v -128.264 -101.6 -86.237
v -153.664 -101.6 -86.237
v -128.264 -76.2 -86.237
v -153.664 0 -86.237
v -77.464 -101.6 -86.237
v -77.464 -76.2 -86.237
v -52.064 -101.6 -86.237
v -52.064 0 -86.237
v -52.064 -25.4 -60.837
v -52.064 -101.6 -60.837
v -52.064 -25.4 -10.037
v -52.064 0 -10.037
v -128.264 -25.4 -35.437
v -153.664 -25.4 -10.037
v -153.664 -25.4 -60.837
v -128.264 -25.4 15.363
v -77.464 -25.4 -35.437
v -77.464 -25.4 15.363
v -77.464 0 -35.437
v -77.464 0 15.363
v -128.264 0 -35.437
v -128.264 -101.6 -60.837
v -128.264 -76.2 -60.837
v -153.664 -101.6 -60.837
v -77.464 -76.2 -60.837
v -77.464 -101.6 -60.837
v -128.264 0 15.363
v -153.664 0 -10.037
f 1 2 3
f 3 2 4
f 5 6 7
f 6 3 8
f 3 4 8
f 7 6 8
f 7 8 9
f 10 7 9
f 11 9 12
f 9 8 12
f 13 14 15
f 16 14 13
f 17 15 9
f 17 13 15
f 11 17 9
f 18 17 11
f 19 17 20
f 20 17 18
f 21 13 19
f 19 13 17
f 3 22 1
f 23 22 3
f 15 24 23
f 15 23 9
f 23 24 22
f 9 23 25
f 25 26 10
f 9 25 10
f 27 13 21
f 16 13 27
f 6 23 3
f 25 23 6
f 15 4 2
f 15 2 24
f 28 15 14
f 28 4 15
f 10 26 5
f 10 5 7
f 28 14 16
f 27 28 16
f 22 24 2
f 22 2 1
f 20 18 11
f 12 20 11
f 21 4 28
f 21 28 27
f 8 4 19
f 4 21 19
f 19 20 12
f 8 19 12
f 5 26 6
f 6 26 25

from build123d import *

# Parameters (mm, degrees)
F0_W      = 101.6
F0_H      = 101.6
F1_DEPTH  = 101.6
F2_W      = 101.6
F2_H      = 50.8
F3_DEPTH  = 76.2
F4_DEPTH  = 76.2
F5_W      = 50.8
F5_H      = 50.8
F6_DEPTH  = 25.4
F8_DEPTH  = 25.4
F10_DEPTH = 25.4
F11_W     = 50.8
F11_H     = 25.4
F12_DEPTH = 25.4


with BuildPart() as f1:
    # F0 (on Front) → F1 (new body)
    with BuildSketch(Plane.XZ):
        with Locations((-102.8639332771, -35.4373262644)):
            Rectangle(F0_W, F0_H)
    extrude(amount=F1_DEPTH)

    # F2 (on face) → F3 (cut)
    with BuildSketch(Plane.XZ.offset(101.6)):
        with Locations((-102.8639332771, -35.4373262644)):
            Rectangle(F2_W, F2_H)
    extrude(amount=-F3_DEPTH, mode=Mode.SUBTRACT)

    # F4 (cut): a face of the model
    f4_faces = [f1.faces().sort_by_distance(p)[0] for p in [
        (-102.8639332771, -101.6, 2.6626737356),
    ]]
    extrude(f4_faces, amount=-F4_DEPTH, mode=Mode.SUBTRACT)

    # F5 (on face) → F6 (cut)
    with BuildSketch(Plane.XZ.offset(25.4)):
        with Locations((-102.8639332771, -10.0373262644)):
            Rectangle(F5_W, F5_H)
    extrude(amount=-F6_DEPTH, mode=Mode.SUBTRACT)

    # F7 (on face) → F8 (cut)
    with BuildSketch(Plane.XZ.offset(25.4)):
        Polygon((-128.2639332771, 15.3626737356), (-153.6639332771, 15.3626737356), (-153.6639332771, -10.0373262644), align=None)
    extrude(amount=-F8_DEPTH, mode=Mode.SUBTRACT)

    # F9 (on face) → F10 (cut)
    with BuildSketch(Plane.XZ.offset(25.4)):
        Polygon((-52.0639332771, -10.0373262644), (-52.0639332771, 15.3626737356), (-77.4639332771, 15.3626737356), align=None)
    extrude(amount=-F10_DEPTH, mode=Mode.SUBTRACT)

    # F11 (on face) → F12 (cut)
    with BuildSketch(Plane.XY.offset(-60.8373262644)):
        with Locations((-102.8639332771, -88.9)):
            Rectangle(F11_W, F11_H)
    extrude(amount=-F12_DEPTH, mode=Mode.SUBTRACT)


solid = f1.part
